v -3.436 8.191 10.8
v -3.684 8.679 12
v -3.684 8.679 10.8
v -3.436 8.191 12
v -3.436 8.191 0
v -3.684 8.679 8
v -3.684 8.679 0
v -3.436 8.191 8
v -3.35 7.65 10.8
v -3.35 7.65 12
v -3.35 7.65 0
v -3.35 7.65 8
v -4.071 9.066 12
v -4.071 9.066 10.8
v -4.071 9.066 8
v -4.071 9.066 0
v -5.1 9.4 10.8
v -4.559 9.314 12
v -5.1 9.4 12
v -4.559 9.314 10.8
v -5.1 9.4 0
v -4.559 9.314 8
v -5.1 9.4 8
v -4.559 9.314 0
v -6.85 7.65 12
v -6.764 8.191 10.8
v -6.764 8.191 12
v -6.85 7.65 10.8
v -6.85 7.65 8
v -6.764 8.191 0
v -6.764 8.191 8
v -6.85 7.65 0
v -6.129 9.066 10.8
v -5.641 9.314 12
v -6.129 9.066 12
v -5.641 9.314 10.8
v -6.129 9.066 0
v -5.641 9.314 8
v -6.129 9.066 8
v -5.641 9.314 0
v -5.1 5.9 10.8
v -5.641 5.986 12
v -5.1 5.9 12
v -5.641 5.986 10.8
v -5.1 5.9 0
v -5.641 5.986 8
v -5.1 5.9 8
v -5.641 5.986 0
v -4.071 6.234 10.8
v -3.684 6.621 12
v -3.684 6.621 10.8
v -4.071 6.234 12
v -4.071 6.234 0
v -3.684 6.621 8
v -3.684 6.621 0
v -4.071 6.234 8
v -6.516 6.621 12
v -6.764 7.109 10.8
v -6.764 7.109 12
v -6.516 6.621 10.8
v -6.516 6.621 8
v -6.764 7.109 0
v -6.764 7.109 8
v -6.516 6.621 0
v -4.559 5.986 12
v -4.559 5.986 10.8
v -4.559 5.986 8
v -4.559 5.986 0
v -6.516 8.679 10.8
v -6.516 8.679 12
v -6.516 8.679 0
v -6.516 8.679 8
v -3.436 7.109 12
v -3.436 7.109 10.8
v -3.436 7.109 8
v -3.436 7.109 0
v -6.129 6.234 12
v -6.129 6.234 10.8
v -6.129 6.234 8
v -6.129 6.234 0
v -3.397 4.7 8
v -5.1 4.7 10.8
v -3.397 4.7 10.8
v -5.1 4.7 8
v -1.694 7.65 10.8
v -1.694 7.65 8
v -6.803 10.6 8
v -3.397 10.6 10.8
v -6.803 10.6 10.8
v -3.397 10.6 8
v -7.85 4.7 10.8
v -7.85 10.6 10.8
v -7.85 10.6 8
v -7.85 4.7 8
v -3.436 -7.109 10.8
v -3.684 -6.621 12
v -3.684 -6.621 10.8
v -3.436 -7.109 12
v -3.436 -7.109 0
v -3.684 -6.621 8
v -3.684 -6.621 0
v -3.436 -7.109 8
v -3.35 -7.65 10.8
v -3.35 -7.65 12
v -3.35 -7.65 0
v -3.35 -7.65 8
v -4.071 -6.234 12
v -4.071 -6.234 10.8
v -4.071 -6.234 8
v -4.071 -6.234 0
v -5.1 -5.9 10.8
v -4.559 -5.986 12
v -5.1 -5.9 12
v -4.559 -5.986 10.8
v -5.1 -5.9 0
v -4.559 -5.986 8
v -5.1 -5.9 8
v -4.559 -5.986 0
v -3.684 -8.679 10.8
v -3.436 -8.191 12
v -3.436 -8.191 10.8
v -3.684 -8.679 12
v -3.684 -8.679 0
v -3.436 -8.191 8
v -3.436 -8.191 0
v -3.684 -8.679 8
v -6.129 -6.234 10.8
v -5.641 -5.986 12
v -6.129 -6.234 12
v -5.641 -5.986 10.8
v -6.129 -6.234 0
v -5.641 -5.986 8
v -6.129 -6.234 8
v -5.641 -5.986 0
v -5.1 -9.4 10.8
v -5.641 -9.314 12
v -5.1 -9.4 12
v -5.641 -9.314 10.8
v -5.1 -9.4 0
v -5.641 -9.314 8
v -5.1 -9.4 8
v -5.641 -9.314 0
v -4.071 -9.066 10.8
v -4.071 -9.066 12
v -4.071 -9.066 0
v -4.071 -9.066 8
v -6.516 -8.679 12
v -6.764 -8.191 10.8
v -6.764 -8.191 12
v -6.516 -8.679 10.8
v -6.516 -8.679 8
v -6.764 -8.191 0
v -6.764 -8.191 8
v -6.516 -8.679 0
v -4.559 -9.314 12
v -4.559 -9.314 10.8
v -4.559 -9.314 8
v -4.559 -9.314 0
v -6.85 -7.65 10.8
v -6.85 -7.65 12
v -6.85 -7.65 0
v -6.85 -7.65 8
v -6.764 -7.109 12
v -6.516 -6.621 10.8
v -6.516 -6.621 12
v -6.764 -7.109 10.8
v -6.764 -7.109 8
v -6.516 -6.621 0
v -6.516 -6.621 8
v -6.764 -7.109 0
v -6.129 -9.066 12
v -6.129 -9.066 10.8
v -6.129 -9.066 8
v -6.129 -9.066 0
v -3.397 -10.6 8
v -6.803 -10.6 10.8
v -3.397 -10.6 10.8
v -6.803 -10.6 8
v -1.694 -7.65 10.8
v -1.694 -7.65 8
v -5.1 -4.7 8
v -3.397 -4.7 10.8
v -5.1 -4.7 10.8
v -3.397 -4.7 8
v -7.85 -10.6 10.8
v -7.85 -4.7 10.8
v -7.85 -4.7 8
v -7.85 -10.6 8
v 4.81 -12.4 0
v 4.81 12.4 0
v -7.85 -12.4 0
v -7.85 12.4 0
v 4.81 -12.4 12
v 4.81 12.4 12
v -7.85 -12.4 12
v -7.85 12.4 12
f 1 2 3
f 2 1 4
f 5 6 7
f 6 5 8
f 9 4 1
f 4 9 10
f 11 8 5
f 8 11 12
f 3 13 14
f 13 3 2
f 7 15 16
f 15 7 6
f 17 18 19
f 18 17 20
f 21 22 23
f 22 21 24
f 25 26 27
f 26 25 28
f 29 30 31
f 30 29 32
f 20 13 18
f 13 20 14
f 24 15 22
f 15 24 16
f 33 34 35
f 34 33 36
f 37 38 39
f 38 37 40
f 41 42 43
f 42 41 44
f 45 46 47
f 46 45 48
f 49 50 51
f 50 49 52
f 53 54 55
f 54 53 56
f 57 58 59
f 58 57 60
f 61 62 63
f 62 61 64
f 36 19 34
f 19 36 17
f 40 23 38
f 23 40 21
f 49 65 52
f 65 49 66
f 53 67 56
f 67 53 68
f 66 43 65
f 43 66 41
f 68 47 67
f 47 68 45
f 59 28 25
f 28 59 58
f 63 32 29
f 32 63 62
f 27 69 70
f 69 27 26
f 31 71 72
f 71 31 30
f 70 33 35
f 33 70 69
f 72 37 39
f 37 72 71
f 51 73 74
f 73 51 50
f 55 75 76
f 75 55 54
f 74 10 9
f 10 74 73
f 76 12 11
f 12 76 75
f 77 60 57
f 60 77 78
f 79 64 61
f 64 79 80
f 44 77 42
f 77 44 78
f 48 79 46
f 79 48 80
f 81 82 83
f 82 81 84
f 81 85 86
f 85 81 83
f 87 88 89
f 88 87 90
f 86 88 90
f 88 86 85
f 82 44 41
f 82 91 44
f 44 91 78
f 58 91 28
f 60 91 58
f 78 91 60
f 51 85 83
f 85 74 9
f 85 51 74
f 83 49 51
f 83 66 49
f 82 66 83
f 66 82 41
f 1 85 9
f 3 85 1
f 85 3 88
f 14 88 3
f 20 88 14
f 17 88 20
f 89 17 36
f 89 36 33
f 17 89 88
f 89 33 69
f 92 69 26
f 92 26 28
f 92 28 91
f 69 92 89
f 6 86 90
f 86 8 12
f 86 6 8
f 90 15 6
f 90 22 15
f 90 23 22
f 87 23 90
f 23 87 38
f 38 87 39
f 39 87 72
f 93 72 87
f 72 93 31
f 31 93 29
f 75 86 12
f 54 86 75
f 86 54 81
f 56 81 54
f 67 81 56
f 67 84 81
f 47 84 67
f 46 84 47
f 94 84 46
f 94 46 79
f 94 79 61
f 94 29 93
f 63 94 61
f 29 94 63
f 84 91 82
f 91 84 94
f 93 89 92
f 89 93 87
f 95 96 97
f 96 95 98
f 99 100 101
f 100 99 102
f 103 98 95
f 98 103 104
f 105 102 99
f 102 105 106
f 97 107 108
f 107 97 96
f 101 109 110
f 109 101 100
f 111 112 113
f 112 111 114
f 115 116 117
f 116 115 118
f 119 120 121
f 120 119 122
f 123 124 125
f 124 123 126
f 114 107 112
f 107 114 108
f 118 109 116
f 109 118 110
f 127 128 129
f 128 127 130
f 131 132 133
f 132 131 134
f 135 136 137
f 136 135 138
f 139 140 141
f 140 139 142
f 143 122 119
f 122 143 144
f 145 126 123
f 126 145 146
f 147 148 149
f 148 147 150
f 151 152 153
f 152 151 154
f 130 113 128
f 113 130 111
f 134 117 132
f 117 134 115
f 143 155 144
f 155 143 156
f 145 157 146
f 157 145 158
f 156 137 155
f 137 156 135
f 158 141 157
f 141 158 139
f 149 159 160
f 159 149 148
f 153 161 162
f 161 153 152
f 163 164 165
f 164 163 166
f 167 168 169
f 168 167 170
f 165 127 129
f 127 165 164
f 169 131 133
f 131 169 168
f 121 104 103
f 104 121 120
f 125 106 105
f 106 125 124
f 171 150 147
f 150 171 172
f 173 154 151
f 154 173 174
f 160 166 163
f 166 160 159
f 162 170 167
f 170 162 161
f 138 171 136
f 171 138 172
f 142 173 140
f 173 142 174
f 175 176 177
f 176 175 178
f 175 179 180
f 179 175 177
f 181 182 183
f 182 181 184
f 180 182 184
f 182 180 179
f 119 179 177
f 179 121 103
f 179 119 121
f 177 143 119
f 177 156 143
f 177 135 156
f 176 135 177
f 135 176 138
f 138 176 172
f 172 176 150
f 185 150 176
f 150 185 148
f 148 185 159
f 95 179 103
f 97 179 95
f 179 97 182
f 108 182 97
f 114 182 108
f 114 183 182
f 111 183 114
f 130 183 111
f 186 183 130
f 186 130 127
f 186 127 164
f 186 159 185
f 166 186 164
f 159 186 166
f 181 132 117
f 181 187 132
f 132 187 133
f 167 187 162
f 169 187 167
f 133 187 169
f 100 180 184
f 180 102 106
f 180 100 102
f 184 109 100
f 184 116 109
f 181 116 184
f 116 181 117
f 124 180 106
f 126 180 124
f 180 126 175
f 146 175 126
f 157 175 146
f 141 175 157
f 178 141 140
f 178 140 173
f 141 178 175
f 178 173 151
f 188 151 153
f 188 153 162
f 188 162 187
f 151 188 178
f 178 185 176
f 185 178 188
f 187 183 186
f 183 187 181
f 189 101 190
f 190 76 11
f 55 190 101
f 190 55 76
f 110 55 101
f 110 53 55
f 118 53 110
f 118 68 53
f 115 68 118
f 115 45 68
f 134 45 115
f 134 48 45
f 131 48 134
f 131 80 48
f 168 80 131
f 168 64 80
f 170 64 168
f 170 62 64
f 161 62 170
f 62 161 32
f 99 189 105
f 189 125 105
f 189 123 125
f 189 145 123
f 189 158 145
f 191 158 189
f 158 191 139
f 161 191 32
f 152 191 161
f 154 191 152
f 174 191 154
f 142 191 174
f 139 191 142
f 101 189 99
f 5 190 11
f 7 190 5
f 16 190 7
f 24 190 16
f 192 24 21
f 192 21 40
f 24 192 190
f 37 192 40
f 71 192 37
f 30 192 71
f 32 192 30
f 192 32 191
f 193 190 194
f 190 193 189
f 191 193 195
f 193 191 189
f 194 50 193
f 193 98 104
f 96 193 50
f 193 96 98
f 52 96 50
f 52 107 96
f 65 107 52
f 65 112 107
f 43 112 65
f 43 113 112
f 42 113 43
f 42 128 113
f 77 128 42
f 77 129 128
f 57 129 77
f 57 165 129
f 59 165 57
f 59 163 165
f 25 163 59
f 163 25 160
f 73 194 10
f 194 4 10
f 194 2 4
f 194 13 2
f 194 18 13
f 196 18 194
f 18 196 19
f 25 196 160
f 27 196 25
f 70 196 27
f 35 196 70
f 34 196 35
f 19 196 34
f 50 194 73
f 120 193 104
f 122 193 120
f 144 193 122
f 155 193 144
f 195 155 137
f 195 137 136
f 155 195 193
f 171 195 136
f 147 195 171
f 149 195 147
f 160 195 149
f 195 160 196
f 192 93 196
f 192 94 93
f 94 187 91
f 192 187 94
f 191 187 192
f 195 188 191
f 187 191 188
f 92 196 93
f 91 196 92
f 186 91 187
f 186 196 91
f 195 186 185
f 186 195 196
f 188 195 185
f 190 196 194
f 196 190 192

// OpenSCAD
m_length = 20.8;
m_width = 15.7;
m_screw_gap = 15.3;
m_edge_to_screw = (20.8-15.3)/2;
m_screw = 3.5;
m_dupont_width = 2.54;
m_gap = .5;
epsilon = .0001;
m_nut_m3 = 5.9;
m_trap_m3 = m_nut_m3/cos(30); // 5.5 = measured across nut
m_m3_nut_height = 2.8;
m_y_bonus = 2;

z_circuit = 0;
z_gyro = 12;
z_d_trap = z_circuit + 8;
z_u_trap = z_d_trap + m_m3_nut_height;

x_l_edge = -m_width/2;
x_r_edge = m_width/2-m_dupont_width-m_gap;
y_b_edge = -m_length/2 - m_y_bonus;
y_t_edge = m_length/2 + m_y_bonus;

x_l_screw = x_l_edge + m_edge_to_screw;
y_t_screw = y_t_edge - m_edge_to_screw - m_y_bonus;
y_b_screw = y_b_edge + m_edge_to_screw + m_y_bonus;

module box( x0, x1, y0, y1, z0, z1 ) {
    translate([0, 0, z0 ] ) {
        linear_extrude( z1-z0 ) polygon([
            [ x0, y0 ],
            [ x1, y0 ],
            [ x1, y1 ],
            [ x0, y1 ]
        ]);
    }
}

module my_cylinder( x, y, z0, z1, diameter, fna ) {
    translate([ x, y, z0 ] ) {
        cylinder( d = diameter, h = z1-z0, $fn = fna );
    }
}

module screw_neg( x, y) {
    my_cylinder( x, y, z_circuit - epsilon, z_gyro + epsilon, m_screw, 20 );
    my_cylinder( x, y, z_d_trap, z_u_trap, m_trap_m3, 6 );
    y_trap = ( y < 0 ) ? y - 10 : y + 10;
    box( x_l_edge - epsilon, x, y - m_nut_m3/2, y + m_nut_m3/2, z_d_trap, z_u_trap );
}


module holder_neg() {
    screw_neg( x_l_screw, y_t_screw );
    screw_neg( x_l_screw, y_b_screw );
}

module holder_pos() {
    box( x_l_edge, x_r_edge, y_b_edge, y_t_edge, z_circuit, z_gyro );
}

module holder() {
    difference() {
        holder_pos();
        holder_neg();
    }
}


holder();
